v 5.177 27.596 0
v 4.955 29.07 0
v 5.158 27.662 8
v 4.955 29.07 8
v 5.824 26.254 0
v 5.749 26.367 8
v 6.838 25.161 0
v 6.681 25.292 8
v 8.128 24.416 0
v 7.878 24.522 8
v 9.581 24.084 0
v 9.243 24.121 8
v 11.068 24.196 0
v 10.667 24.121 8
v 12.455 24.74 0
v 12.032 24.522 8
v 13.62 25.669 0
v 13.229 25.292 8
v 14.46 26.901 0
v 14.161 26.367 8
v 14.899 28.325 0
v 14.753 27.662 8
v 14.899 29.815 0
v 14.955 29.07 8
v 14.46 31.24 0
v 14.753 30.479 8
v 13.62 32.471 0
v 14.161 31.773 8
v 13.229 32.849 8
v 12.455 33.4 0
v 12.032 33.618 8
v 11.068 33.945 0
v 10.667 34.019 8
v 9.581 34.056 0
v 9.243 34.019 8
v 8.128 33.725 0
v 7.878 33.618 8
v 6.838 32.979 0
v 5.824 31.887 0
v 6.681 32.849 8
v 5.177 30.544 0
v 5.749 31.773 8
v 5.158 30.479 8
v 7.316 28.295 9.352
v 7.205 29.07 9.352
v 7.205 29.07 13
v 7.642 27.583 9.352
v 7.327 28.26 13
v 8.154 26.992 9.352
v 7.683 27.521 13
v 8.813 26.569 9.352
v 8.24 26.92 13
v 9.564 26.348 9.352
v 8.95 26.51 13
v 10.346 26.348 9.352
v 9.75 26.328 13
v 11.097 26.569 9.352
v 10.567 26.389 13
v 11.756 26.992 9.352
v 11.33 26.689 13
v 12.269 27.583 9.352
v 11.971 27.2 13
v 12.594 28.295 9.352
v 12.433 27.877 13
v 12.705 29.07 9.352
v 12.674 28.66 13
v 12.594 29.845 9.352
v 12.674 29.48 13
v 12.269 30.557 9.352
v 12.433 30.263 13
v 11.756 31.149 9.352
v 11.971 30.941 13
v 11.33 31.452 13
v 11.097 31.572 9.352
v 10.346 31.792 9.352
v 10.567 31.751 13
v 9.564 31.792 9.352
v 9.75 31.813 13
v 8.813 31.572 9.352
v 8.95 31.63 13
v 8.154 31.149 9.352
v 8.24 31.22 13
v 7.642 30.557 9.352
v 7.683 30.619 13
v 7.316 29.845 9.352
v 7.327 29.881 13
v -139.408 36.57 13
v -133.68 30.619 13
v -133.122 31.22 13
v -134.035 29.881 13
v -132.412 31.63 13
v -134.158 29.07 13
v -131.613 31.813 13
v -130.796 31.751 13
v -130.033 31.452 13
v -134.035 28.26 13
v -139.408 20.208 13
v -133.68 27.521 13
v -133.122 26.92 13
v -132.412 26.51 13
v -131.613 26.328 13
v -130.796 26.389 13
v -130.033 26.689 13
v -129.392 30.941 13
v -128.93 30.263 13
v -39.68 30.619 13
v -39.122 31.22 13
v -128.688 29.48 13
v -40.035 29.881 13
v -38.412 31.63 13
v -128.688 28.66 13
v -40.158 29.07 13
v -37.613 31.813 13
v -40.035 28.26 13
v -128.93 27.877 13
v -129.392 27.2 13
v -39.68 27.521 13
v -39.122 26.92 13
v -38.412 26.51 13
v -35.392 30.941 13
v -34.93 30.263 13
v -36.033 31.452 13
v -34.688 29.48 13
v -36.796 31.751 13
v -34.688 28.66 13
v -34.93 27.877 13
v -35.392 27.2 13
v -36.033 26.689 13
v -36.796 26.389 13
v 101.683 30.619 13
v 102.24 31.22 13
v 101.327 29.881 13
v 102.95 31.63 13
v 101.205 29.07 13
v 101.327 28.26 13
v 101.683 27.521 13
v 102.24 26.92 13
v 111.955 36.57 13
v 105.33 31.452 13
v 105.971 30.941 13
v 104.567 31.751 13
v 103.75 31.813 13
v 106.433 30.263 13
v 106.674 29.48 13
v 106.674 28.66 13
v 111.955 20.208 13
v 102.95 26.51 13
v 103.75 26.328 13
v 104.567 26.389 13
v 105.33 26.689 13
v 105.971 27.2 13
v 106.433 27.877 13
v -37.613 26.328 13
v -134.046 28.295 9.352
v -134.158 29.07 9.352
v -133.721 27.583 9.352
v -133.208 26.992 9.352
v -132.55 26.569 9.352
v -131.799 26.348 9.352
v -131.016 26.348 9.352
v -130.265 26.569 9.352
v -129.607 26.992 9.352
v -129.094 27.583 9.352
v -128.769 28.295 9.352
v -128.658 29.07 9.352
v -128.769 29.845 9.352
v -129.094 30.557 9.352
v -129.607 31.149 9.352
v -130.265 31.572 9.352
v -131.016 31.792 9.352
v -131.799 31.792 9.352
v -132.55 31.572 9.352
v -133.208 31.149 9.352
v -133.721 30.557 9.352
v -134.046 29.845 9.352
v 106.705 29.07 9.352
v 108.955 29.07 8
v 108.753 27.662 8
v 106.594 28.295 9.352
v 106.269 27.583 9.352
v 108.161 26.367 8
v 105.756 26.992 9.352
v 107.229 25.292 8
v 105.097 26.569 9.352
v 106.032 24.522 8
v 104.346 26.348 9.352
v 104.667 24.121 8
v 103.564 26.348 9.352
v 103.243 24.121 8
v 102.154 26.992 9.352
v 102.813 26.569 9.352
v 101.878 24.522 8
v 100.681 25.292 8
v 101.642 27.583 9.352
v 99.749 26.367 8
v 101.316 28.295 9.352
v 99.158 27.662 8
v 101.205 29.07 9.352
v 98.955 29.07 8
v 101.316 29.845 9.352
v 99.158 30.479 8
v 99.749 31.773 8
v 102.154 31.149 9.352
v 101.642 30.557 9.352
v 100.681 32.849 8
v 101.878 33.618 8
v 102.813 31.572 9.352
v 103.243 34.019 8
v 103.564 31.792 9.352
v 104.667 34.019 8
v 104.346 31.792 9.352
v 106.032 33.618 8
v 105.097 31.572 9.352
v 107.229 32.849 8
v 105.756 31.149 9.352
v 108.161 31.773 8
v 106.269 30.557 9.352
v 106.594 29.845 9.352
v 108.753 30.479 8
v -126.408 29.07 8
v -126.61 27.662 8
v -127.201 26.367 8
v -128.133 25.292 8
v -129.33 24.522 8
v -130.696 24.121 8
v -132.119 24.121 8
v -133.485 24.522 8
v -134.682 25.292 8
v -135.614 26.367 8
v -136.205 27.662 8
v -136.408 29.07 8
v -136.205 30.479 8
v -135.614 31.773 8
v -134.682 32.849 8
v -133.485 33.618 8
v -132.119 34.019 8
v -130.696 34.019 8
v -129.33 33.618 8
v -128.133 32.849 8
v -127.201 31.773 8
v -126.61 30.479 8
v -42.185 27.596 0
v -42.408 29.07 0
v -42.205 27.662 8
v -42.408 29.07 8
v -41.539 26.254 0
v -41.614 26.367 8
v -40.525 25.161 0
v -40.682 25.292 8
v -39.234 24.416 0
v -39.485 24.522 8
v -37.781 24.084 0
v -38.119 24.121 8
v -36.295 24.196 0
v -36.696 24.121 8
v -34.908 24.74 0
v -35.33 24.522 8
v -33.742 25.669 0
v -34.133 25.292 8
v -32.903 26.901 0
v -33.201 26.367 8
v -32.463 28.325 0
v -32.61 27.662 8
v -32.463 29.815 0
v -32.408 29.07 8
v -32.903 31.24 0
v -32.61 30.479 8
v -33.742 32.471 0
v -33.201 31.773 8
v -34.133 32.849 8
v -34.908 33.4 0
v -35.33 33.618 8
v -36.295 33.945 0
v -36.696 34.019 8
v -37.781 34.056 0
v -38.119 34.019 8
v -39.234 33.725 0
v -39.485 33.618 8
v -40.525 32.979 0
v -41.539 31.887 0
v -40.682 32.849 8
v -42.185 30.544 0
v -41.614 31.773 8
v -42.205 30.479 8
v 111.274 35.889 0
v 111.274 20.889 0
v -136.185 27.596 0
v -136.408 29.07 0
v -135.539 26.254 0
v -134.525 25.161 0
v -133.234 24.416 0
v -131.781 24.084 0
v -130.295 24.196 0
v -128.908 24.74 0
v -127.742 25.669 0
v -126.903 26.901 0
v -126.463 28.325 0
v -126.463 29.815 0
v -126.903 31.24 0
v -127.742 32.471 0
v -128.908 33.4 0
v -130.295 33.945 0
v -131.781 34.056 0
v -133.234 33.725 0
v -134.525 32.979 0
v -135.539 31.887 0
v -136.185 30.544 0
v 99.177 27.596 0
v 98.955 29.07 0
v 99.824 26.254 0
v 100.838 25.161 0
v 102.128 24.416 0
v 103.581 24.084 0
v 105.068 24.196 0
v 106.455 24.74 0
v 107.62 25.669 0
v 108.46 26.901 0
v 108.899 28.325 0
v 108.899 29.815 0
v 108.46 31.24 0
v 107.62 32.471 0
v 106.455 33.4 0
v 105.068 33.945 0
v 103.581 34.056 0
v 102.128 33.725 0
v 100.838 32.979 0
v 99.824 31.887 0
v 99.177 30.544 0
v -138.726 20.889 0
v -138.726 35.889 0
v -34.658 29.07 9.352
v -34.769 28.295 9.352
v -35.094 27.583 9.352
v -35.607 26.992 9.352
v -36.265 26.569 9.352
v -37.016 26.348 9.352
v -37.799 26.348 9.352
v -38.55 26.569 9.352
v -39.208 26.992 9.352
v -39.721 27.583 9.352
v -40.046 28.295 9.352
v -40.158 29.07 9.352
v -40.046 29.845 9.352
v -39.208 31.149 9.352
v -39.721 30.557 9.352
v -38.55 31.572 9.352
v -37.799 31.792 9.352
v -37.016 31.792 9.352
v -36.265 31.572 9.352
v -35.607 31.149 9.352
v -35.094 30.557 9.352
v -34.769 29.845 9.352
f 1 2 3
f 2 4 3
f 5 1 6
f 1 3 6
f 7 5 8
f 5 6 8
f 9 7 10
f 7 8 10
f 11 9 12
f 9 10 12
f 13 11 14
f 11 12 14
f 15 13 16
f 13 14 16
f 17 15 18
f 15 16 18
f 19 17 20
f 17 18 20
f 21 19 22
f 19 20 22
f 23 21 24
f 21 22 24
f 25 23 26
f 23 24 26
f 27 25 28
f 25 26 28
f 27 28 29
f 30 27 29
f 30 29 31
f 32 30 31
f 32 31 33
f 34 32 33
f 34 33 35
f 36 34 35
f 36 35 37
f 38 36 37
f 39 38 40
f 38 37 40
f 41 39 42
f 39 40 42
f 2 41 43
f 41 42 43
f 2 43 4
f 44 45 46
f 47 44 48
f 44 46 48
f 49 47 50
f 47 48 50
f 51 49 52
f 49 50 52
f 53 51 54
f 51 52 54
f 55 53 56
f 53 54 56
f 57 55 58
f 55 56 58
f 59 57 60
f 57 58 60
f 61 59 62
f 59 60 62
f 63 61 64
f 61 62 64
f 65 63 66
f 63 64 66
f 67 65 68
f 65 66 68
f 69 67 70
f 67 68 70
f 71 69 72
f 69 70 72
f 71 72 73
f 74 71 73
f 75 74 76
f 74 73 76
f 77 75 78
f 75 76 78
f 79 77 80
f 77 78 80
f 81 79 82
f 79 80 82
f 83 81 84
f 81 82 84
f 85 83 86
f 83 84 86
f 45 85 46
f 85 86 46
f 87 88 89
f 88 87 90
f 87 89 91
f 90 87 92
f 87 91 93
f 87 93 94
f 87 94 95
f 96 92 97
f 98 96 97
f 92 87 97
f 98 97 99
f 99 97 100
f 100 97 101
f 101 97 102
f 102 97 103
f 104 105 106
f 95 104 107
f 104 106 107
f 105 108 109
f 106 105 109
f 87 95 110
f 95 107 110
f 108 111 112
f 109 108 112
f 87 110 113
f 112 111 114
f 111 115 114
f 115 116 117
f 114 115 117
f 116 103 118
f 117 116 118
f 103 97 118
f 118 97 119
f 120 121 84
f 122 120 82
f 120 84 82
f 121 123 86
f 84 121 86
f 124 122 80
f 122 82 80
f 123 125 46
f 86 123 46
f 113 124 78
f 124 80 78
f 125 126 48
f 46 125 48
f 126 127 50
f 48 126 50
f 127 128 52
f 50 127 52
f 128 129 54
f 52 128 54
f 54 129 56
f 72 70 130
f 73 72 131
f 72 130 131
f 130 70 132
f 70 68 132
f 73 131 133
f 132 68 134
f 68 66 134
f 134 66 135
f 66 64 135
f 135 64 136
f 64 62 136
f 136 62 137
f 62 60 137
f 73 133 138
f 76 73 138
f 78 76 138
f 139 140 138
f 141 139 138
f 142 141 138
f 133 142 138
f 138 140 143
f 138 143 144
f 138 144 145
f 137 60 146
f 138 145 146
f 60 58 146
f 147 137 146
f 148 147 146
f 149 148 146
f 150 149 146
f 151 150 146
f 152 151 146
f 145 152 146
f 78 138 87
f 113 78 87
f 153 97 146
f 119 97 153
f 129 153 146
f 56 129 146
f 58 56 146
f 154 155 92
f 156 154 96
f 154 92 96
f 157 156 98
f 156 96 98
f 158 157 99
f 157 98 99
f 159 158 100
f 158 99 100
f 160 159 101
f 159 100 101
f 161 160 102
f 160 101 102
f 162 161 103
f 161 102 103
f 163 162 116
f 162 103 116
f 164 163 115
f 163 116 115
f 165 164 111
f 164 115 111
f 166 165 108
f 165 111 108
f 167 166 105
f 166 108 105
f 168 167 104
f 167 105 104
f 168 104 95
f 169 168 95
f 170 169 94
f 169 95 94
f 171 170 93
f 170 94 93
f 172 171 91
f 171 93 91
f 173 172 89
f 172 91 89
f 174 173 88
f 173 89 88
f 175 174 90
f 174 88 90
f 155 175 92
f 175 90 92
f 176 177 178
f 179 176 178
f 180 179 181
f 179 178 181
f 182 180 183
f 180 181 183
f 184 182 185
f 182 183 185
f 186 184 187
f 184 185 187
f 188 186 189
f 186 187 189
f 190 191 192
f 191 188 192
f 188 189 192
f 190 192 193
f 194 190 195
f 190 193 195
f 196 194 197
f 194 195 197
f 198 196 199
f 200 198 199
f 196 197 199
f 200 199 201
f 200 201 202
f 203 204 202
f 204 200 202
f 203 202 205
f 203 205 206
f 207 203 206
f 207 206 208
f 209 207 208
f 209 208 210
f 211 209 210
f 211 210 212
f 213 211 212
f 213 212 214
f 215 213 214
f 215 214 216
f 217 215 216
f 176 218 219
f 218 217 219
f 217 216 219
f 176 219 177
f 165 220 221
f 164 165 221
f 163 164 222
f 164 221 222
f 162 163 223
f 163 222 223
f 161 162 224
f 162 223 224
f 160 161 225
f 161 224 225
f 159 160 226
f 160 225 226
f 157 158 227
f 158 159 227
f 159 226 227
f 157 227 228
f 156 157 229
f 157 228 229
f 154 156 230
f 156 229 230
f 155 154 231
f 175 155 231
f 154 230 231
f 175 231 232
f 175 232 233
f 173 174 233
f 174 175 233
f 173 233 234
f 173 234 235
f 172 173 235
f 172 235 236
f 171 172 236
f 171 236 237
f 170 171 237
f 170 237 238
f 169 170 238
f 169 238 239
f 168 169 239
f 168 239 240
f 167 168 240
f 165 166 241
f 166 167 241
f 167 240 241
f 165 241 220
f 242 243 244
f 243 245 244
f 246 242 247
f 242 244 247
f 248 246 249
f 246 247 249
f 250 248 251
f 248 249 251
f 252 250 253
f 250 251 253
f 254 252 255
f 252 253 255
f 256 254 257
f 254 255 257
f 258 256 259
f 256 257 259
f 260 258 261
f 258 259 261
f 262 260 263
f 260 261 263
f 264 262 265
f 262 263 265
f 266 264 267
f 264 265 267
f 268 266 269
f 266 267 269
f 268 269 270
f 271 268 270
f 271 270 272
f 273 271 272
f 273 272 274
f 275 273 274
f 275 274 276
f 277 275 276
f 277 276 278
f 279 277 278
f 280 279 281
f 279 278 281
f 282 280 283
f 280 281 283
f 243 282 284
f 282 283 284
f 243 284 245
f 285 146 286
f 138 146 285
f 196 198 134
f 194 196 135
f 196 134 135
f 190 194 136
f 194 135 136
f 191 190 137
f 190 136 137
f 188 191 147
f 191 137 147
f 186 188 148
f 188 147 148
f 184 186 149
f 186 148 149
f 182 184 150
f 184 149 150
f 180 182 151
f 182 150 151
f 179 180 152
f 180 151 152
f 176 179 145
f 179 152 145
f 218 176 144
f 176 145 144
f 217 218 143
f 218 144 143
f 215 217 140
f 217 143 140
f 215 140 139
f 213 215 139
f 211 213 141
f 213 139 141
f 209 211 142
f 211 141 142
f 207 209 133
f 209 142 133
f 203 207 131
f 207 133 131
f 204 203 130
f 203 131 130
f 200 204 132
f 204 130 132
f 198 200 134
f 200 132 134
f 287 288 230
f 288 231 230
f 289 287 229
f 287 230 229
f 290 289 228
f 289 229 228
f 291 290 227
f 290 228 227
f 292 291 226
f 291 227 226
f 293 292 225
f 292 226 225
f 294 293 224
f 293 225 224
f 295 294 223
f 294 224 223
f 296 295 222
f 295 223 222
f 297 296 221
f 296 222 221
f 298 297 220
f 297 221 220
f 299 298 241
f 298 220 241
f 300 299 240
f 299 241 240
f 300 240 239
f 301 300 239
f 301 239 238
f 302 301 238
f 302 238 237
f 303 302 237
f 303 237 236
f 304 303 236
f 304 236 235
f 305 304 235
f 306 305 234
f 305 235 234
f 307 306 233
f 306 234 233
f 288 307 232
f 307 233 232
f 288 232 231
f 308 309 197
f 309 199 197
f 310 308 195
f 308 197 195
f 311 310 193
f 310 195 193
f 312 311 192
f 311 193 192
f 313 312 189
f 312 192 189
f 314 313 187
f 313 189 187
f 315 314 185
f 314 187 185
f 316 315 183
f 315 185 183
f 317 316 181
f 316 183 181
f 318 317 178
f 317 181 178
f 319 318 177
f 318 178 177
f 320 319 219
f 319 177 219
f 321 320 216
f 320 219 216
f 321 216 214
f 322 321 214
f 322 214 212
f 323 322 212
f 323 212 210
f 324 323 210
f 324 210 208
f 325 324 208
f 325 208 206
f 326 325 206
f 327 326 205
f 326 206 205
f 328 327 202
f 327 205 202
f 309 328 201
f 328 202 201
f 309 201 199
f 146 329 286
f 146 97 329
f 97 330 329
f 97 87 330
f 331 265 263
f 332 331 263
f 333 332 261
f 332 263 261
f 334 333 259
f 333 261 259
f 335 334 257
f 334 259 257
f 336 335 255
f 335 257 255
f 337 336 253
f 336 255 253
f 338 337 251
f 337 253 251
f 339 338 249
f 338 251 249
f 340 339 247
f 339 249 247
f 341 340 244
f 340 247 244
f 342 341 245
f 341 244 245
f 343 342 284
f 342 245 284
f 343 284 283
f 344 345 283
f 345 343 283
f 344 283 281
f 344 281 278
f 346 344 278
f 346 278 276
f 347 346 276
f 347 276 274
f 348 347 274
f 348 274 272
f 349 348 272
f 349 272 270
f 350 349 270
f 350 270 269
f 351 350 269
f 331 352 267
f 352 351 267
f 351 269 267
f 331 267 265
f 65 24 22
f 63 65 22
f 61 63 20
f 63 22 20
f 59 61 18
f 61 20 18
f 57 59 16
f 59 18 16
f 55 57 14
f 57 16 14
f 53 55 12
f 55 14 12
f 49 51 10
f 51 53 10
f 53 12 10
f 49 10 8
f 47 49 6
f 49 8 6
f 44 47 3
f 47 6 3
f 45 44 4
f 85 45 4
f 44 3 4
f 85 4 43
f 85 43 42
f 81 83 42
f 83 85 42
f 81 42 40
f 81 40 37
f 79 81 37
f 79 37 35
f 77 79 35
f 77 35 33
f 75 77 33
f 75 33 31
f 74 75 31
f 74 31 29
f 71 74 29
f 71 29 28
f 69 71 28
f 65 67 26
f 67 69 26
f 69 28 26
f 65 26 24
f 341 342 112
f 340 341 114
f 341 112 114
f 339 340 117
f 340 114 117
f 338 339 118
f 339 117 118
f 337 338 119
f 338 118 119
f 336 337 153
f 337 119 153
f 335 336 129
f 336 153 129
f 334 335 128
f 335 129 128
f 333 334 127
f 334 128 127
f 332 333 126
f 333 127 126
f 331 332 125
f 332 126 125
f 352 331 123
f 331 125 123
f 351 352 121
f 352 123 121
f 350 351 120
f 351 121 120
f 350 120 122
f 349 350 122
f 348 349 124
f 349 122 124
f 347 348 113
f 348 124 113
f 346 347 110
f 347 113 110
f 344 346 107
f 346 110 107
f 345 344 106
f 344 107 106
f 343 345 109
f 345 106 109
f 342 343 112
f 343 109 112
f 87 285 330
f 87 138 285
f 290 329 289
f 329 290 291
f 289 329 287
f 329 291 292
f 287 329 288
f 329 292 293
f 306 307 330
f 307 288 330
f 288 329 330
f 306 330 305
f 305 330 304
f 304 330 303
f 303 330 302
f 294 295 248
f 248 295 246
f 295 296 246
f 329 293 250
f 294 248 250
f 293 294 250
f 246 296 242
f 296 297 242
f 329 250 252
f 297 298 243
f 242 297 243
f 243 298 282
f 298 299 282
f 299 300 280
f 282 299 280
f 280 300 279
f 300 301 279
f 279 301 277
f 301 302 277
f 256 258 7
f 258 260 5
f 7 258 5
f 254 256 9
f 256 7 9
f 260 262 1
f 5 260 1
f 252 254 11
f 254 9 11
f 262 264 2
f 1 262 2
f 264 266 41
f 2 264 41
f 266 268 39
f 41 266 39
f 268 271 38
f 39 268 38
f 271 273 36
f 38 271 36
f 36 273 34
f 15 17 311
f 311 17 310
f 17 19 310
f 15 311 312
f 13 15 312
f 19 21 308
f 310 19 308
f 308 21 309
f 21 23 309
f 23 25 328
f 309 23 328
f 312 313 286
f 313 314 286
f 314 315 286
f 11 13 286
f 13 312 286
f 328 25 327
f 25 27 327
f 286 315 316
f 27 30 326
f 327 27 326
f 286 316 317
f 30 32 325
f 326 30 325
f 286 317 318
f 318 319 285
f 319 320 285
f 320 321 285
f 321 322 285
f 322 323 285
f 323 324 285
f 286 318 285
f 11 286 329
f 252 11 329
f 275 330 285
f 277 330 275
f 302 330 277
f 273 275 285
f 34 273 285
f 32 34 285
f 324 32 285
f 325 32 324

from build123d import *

# Parameters (mm, degrees)
F0_W     = 250
F0_H     = 15
F1_DEPTH = 13
F1_TAPER = -3
F3_D     = 5.5
F4_D     = 10
F4_DEPTH = 8
F4_TIP   = 3.0043030951


with BuildPart() as f1:
    # F0 (on Top) → F1 (new body)
    with BuildSketch(Plane.XY):
        with Locations((-13.7262433767, 28.3889581655)):
            Rectangle(F0_W, F0_H)
    extrude(amount=F1_DEPTH, taper=F1_TAPER)

    # F3 (through all)
    with Locations(Plane(origin=(0, 0, 0), x_dir=(1, 0, 0), z_dir=(0, 0, -1))):
        with Locations((-131.4075445074, -29.0702592962), (-37.4075445074, -29.0702592962), (9.9550577539, -29.0702592962), (103.9550577539, -29.0702592962)):
            Hole(F3_D / 2)

    # F4
    with Locations(Plane(origin=(0, 0, 0), x_dir=(1, 0, 0), z_dir=(0, 0, -1))):
        with Locations((-37.4075445074, -29.0702592962), (9.9550577539, -29.0702592962), (103.9550577539, -29.0702592962), (-131.4075445074, -29.0702592962)):
            Hole(F4_D / 2, depth=F4_DEPTH)
            with Locations((0, 0, -(F4_DEPTH + F4_TIP / 2))):  # 118° drill point
                Cone(0, F4_D / 2, F4_TIP, mode=Mode.SUBTRACT)


solid = f1.part
